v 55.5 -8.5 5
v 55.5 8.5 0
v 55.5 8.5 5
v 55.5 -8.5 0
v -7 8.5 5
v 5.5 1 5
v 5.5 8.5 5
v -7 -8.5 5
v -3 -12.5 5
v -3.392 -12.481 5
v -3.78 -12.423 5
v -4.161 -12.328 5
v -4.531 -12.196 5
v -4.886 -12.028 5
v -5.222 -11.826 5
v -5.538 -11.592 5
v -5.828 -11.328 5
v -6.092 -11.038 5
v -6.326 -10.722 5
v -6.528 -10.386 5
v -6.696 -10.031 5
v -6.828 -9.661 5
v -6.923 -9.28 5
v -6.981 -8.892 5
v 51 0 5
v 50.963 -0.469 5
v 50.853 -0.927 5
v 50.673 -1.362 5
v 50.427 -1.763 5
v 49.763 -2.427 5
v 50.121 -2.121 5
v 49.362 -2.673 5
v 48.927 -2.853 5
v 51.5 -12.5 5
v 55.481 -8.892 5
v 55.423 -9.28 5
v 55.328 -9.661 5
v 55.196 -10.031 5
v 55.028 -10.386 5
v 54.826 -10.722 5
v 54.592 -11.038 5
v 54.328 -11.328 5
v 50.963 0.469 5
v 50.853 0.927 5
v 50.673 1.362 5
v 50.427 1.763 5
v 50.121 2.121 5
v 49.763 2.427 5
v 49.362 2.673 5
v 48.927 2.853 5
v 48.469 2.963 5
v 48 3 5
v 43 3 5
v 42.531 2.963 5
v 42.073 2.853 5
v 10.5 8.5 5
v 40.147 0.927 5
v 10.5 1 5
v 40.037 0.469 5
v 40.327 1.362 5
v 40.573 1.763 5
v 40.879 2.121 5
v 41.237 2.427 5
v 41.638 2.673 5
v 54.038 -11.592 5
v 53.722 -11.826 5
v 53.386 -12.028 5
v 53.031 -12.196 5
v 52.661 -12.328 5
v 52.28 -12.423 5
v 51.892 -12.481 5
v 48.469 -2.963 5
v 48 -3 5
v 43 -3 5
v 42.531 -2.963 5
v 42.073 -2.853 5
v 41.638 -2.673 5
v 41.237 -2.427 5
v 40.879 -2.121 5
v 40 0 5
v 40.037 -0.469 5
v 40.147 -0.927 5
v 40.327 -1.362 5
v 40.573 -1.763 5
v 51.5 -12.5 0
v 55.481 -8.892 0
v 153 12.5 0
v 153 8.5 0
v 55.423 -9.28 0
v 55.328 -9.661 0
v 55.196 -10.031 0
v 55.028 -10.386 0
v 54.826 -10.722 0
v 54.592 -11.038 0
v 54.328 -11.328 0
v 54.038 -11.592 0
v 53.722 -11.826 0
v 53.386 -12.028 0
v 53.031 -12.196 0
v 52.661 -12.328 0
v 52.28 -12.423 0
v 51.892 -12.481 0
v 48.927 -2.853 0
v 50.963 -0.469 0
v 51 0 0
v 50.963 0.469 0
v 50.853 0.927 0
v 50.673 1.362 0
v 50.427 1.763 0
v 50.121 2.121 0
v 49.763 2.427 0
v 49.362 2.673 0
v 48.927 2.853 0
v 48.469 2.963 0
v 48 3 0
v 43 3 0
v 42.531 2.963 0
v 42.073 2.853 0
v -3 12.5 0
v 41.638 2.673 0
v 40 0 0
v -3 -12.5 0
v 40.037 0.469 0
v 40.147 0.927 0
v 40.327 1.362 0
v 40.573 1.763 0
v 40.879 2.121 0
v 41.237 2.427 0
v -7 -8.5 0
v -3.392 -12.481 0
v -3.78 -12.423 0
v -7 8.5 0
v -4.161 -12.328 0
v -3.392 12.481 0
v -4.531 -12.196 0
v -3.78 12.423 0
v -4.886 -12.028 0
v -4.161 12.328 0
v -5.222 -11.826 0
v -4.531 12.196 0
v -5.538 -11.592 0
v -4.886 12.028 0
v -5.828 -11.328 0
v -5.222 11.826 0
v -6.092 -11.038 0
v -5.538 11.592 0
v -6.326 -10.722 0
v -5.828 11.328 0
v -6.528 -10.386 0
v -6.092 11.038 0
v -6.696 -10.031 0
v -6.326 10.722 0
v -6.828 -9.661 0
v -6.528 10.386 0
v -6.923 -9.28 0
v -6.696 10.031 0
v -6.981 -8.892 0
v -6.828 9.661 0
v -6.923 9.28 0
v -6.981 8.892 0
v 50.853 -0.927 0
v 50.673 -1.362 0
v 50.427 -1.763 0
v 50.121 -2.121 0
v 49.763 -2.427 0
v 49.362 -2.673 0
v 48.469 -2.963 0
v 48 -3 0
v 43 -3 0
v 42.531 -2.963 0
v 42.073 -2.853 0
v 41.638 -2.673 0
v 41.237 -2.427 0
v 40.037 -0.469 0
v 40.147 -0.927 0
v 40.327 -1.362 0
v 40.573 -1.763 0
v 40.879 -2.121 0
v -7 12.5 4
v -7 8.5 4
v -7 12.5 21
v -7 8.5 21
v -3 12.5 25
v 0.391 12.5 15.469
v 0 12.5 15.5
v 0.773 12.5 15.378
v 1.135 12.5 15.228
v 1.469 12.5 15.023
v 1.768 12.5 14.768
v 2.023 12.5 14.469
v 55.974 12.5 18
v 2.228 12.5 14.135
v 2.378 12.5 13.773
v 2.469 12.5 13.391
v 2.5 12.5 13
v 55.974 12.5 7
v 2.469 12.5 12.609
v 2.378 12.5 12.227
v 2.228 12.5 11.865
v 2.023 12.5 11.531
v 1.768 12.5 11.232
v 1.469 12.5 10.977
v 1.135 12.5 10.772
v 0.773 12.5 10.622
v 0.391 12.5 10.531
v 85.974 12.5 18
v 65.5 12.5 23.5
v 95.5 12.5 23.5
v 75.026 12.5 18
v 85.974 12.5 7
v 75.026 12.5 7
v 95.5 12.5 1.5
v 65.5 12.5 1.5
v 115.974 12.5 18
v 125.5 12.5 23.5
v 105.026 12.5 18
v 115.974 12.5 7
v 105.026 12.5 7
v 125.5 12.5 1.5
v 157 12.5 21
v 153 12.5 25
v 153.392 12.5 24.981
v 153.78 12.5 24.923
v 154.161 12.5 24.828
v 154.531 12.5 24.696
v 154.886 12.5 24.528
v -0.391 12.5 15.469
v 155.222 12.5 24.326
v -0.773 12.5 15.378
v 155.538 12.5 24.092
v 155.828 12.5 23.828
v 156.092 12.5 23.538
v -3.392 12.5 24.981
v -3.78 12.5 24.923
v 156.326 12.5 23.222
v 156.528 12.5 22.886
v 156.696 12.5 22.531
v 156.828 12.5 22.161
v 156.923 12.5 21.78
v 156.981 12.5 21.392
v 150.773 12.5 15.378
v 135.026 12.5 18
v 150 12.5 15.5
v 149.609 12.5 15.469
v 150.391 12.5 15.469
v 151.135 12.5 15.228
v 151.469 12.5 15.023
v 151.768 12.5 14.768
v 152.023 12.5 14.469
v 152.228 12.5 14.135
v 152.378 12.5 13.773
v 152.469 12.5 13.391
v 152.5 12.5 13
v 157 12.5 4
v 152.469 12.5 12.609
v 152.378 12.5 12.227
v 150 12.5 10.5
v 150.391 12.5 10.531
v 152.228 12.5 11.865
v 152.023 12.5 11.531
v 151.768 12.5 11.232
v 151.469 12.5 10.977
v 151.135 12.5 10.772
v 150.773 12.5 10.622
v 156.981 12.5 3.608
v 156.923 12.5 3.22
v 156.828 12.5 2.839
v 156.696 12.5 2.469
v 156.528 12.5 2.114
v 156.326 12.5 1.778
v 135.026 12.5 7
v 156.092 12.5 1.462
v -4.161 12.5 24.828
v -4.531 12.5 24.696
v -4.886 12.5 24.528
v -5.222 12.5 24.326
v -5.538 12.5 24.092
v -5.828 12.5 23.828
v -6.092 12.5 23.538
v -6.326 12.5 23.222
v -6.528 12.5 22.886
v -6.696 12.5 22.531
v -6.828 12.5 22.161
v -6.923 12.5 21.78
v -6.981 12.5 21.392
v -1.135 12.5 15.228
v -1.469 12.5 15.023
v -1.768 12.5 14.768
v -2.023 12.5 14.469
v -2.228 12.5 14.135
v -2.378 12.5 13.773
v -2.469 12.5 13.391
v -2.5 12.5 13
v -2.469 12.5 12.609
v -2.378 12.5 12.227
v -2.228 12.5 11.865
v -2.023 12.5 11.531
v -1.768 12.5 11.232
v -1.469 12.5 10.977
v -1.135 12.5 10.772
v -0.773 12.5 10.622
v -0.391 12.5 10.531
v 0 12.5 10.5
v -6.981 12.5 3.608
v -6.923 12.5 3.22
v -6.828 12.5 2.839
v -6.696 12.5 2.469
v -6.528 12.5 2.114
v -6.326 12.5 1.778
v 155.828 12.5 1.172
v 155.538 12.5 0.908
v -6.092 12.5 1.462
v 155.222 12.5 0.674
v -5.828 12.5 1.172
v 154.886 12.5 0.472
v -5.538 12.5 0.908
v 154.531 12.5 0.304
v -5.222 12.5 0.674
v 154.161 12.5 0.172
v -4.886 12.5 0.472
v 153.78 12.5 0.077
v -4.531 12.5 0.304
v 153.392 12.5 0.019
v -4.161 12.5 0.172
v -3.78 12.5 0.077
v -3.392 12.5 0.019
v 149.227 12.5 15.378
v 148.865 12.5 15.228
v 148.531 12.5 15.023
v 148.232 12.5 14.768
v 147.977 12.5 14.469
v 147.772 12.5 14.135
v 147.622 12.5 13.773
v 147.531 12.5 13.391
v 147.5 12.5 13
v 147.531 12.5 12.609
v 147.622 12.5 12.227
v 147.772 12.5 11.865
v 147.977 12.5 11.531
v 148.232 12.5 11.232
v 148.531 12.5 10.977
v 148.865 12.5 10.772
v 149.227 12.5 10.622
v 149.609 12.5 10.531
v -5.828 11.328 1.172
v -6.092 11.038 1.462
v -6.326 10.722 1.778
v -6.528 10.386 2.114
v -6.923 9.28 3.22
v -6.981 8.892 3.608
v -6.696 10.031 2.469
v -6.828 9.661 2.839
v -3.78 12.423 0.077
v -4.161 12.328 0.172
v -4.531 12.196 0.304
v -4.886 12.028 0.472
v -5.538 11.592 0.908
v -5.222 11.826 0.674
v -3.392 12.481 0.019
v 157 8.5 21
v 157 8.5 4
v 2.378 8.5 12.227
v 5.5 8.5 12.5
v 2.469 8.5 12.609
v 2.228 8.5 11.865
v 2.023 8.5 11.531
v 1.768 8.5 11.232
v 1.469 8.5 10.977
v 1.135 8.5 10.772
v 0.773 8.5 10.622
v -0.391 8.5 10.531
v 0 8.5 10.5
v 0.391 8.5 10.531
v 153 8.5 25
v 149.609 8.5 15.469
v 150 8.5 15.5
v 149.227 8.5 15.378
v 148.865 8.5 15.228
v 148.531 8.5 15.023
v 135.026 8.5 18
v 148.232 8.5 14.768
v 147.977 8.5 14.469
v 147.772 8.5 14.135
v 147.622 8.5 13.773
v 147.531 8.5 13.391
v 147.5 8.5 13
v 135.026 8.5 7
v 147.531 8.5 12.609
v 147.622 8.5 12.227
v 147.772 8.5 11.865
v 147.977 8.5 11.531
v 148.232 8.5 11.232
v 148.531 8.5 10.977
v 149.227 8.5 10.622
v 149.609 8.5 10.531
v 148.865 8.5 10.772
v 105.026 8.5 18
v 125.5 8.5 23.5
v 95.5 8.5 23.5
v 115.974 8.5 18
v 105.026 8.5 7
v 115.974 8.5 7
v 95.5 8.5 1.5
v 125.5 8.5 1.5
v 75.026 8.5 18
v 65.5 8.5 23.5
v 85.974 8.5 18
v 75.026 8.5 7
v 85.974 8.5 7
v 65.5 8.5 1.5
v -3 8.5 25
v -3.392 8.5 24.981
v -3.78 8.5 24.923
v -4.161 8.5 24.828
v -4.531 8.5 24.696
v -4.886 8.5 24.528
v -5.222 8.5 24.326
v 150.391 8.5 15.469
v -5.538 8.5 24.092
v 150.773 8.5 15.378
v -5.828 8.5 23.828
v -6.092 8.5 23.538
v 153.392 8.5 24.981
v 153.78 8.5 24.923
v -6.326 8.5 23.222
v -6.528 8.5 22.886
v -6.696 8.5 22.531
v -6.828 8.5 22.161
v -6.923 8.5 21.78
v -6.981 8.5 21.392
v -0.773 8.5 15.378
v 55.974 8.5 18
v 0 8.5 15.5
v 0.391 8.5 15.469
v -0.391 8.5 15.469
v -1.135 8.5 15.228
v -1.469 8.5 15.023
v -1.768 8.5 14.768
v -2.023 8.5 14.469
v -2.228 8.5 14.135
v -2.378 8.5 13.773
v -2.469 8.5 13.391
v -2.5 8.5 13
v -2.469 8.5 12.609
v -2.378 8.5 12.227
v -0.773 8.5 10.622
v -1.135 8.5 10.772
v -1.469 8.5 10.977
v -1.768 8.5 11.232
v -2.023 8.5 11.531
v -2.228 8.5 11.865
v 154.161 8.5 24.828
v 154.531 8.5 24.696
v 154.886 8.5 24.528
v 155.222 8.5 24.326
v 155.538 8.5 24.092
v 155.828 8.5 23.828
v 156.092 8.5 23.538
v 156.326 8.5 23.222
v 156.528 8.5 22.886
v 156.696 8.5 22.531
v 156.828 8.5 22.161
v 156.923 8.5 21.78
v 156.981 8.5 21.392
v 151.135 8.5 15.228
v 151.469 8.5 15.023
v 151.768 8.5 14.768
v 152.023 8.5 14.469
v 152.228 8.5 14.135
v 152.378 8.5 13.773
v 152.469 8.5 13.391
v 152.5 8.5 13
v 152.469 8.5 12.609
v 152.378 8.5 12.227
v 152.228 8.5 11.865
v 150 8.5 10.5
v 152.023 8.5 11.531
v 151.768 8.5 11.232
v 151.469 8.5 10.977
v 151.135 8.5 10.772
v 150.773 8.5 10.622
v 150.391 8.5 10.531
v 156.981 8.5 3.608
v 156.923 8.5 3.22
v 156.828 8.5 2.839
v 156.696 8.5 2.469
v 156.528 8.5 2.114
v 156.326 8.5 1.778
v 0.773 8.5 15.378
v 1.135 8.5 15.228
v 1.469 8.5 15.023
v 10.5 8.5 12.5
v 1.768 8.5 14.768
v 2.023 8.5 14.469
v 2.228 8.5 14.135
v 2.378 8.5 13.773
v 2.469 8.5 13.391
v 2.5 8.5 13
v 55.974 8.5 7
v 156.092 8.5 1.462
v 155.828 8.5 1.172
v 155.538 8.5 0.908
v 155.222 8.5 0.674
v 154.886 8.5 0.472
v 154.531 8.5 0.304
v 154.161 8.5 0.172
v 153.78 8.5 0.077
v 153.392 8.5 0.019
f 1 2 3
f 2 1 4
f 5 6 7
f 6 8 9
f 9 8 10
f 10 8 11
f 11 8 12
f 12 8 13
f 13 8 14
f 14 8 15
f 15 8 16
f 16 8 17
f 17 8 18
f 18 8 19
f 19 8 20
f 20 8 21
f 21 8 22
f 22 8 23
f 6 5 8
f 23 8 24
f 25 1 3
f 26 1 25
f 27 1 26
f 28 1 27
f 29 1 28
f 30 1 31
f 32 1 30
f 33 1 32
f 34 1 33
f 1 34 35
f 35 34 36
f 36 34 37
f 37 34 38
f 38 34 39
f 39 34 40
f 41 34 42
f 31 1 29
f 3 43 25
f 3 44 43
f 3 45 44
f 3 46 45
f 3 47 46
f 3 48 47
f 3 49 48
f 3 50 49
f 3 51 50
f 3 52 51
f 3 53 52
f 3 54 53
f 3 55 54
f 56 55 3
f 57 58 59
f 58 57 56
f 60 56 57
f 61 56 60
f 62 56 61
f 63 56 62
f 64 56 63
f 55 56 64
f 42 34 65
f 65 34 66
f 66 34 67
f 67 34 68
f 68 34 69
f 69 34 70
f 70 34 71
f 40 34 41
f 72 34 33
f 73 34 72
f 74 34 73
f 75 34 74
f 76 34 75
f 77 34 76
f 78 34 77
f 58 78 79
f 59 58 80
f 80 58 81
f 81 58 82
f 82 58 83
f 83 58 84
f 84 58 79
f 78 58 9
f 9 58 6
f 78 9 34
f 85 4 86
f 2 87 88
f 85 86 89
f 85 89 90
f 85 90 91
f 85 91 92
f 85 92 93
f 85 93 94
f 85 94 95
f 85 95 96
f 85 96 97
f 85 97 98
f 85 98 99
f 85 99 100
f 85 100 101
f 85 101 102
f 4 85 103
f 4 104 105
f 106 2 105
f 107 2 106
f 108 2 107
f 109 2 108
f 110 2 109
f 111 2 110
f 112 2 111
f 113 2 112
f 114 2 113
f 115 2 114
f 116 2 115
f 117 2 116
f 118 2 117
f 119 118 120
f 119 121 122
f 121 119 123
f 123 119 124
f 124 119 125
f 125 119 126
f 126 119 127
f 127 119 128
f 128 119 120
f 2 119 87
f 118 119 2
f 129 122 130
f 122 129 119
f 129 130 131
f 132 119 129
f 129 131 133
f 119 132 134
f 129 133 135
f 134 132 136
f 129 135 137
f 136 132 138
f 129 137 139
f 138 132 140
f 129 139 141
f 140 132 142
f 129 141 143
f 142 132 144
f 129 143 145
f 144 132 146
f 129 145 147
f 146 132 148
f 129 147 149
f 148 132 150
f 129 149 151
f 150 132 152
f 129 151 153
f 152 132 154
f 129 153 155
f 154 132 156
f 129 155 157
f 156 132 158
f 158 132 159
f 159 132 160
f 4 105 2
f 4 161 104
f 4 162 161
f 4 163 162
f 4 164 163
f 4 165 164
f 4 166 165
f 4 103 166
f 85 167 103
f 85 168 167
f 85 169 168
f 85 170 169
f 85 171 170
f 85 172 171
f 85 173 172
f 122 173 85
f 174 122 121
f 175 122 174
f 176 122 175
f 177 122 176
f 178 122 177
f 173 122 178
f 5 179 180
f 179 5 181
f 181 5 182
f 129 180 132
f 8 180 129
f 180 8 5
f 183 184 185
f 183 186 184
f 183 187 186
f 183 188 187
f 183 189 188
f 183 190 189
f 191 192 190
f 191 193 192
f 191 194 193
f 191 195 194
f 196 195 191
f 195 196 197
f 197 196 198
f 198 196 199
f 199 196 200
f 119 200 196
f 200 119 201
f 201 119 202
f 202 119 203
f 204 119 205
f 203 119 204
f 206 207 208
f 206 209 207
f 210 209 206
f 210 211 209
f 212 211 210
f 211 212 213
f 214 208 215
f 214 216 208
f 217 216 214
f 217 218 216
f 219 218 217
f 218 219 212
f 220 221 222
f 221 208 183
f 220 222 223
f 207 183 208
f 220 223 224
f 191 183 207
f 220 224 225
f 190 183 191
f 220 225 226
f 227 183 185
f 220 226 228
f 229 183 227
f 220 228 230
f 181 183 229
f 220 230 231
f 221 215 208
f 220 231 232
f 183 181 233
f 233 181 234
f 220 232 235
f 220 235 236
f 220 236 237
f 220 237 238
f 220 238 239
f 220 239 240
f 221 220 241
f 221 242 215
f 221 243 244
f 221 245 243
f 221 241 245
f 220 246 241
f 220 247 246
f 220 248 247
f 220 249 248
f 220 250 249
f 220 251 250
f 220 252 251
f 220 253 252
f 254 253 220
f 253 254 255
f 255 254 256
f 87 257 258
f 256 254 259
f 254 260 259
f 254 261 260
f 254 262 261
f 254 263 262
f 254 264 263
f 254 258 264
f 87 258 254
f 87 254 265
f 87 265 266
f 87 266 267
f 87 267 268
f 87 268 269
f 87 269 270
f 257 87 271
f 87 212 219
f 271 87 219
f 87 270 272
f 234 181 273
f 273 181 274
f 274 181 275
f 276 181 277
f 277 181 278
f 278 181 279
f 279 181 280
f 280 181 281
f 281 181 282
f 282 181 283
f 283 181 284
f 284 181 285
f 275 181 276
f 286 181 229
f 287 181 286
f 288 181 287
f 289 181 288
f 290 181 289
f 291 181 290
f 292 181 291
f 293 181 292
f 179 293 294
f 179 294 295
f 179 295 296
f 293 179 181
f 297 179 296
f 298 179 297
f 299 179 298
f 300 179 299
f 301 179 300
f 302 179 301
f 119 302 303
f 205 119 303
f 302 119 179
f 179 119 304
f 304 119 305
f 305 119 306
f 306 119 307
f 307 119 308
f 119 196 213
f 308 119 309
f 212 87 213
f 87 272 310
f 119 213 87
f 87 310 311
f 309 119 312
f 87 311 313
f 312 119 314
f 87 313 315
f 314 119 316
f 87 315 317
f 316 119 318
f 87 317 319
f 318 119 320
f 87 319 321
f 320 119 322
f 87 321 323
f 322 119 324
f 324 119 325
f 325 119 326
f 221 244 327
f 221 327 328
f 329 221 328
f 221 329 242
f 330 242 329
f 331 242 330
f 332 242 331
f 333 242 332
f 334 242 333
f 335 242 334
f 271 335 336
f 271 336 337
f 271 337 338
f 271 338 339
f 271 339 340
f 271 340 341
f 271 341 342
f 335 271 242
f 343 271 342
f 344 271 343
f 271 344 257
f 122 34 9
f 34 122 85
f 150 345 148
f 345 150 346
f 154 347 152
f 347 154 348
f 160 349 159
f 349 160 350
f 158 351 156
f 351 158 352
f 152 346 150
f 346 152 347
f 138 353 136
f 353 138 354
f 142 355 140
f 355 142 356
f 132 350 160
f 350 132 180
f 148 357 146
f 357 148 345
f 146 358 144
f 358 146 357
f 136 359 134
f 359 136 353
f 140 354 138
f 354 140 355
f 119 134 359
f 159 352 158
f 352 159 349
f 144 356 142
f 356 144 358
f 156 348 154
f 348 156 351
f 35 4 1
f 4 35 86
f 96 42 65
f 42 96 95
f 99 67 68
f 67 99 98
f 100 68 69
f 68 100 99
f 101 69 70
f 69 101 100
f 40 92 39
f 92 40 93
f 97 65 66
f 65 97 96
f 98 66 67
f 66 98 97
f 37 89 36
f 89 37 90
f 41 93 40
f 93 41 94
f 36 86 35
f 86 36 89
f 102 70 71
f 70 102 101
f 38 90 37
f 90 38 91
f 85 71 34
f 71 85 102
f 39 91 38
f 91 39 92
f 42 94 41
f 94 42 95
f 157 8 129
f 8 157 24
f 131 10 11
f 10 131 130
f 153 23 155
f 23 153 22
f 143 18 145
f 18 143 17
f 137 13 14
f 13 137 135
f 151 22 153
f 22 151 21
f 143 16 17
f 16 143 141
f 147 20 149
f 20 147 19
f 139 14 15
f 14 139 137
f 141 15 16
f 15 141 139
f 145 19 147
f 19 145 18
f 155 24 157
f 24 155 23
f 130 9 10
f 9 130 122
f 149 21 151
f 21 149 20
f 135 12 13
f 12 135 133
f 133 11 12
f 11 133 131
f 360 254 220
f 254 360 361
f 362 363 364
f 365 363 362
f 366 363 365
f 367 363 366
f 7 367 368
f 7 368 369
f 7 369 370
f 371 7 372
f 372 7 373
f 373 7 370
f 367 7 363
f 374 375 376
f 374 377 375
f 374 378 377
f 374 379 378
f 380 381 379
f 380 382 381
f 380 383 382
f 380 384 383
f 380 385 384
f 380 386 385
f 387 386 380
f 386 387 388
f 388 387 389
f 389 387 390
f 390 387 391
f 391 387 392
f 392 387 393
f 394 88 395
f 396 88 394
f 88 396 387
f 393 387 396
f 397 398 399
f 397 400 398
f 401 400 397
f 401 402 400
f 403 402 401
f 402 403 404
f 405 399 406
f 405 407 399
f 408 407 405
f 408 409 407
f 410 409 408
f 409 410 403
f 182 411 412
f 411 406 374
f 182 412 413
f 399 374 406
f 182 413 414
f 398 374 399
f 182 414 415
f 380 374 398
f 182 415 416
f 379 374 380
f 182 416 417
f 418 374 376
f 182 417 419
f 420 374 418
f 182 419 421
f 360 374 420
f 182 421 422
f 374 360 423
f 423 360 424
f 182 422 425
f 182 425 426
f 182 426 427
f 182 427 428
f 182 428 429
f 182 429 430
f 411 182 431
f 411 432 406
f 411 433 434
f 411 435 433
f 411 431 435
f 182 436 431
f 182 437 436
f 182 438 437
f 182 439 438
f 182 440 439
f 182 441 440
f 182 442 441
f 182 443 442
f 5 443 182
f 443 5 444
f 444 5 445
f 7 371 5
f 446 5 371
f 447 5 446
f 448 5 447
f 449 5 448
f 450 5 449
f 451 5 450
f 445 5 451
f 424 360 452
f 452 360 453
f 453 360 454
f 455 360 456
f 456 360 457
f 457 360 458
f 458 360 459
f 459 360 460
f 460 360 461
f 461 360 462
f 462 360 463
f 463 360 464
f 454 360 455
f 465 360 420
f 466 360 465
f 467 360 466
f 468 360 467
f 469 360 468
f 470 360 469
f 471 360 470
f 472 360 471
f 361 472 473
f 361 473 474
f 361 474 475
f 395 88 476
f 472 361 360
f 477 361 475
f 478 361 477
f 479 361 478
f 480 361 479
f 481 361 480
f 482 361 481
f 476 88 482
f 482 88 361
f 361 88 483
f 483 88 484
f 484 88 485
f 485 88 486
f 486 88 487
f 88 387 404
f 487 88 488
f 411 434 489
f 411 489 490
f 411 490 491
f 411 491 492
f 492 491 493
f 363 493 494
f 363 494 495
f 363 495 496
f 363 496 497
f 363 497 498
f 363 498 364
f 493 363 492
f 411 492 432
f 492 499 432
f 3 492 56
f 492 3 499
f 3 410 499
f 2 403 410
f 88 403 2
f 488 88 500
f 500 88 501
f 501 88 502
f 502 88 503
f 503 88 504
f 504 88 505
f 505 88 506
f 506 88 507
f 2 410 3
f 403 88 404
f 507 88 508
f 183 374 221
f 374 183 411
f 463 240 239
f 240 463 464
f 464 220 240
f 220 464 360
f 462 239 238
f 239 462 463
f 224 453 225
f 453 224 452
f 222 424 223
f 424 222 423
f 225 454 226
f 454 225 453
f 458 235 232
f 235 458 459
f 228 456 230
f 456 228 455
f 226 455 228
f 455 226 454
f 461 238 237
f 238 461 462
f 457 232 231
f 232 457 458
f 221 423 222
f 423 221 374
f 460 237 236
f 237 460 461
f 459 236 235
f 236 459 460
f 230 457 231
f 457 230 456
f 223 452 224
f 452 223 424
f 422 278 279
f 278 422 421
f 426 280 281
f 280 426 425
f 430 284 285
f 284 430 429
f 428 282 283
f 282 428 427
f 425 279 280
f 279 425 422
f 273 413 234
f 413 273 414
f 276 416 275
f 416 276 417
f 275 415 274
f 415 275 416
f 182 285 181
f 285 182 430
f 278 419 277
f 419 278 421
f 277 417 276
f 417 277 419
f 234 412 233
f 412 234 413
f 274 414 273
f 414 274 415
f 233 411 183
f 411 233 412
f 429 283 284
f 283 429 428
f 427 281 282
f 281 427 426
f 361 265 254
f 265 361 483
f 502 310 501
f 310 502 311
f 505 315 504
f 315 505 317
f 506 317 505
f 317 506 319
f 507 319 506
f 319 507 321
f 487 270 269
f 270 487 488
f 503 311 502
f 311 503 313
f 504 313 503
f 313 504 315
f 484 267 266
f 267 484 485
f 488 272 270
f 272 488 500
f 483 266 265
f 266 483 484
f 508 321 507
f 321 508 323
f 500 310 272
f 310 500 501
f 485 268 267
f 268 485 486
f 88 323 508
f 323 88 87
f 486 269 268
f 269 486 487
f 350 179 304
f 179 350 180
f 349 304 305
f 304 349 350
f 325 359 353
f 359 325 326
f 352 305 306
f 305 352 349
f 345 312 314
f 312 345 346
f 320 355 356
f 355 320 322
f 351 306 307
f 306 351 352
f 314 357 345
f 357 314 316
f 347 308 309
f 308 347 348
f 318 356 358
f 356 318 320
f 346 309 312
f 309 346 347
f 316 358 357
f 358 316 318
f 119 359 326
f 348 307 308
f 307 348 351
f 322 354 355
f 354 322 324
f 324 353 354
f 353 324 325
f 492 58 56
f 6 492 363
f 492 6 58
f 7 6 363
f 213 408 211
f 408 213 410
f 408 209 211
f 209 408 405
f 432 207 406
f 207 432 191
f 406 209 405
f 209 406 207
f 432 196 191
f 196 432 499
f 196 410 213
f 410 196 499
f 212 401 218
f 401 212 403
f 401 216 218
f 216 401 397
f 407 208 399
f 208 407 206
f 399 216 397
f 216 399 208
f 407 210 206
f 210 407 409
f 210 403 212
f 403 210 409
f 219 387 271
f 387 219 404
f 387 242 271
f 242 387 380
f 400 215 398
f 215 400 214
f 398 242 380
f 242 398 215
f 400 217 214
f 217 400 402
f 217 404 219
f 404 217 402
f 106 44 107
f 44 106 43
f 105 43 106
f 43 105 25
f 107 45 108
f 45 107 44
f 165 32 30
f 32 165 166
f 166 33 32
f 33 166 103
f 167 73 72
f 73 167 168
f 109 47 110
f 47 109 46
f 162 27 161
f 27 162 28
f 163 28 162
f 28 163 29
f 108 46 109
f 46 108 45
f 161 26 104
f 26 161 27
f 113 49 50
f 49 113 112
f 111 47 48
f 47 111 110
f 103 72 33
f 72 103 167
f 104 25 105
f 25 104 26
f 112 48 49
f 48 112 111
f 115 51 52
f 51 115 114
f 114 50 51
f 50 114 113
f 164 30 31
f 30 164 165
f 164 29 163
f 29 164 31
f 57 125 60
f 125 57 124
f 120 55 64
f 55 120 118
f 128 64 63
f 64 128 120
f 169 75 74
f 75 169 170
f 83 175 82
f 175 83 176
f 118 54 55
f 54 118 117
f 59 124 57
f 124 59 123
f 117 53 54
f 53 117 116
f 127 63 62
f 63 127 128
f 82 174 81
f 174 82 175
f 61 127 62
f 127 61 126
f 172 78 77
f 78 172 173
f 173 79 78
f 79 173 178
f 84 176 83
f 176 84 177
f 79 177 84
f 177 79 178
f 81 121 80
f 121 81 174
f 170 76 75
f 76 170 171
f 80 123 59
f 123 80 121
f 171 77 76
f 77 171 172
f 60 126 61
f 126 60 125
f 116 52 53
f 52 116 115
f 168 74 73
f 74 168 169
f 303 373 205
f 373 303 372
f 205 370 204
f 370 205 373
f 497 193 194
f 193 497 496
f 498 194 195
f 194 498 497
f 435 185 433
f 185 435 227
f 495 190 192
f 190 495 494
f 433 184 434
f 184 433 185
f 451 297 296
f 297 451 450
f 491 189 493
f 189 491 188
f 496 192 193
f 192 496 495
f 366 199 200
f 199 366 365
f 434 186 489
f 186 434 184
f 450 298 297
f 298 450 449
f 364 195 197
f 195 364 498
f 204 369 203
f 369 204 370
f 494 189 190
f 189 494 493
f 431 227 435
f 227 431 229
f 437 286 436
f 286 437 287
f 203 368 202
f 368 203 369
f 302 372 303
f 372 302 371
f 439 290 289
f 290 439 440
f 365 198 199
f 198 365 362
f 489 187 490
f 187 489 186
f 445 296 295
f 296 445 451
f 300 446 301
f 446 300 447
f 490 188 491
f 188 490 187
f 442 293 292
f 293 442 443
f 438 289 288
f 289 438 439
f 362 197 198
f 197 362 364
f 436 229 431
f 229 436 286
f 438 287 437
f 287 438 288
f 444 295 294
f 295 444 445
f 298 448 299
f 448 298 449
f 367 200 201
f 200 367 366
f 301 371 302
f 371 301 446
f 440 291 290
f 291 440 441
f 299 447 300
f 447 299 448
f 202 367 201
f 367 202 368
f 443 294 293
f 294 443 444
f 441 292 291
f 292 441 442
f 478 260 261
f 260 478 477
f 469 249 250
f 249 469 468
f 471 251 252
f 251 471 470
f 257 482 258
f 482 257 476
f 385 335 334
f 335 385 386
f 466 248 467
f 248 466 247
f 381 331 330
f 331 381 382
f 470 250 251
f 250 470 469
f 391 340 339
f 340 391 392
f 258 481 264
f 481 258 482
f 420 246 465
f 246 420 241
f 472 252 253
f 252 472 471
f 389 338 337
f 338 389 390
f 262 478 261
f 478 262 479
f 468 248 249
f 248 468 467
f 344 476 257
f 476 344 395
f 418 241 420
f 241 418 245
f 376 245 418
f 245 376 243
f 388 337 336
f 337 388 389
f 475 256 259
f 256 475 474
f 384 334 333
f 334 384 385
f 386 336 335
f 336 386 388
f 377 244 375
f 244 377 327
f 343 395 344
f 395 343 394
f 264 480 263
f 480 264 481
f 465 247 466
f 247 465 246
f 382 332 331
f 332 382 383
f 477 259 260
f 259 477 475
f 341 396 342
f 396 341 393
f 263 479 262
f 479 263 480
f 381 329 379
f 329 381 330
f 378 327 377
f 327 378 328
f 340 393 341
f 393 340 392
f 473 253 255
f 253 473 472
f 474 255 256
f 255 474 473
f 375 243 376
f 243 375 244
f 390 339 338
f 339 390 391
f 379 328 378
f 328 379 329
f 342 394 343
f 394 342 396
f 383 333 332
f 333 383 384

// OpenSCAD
distance_leftscrew_to_mount = 45.5;

difference()
{
    union()
    {
        translate([(distance_leftscrew_to_mount+7+10)/2-7,0,5/2])
        rounded_box(distance_leftscrew_to_mount+7+10,25,5,4,$fn=64);
        
        translate([0,25/2+1/2,0])
        rotate([90,0,0])
        translate([(150+7*2)/2-7,25/2,5/2])
        rounded_box(150+7*2,25,4,4,$fn=64);
        
        translate([8,-5+11,5])
        rotate([0,0,-90])
        ramp(10,5,10,0);
        
        //translate([66,-5+11,5])
        //rotate([0,0,-90])
        //ramp(10,5,10,0);
    }
    
    for(i=[0:2])
    translate([distance_leftscrew_to_mount+20+i*30,25/2+1,25/2])
    rotate([90,0,0])
    rotate([0,0,30])
    cylinder(d=22,h=6,$fn=6);
    
    translate([distance_leftscrew_to_mount,0,-1])
    stretched_cylinder(d=6,h=7,$fn=40,stretch=5);
    
    translate([0,25/2,12.8+0.2])
    rotate([90,0,0])
    translate([0,0,-1])
    cylinder(d=5,h=7,$fn=40);
    
    translate([0,25/2,12.8+0.2])
    rotate([90,0,0])
    translate([150,0,-1])
    cylinder(d=5,h=7,$fn=40);
}

module stretched_cylinder(d, h, stretch, center=false)
{
  if (center)
    stretched_cylinder_geom(d=d, h=h, stretch=stretch);
  else
    translate([0,0,h/2])
    stretched_cylinder_geom(d=d, h=h, stretch=stretch);
}

module stretched_cylinder_geom(d, h, stretch)
{
    union()
    {
        translate([stretch/2,0,0])
        cylinder(d=d,h=h,center=true);
        
        translate([-stretch/2,0,0])
        cylinder(d=d,h=h,center=true);
        
        cube([stretch,d,h],center=true);
    }
}

module ramp(x,y,z1,z2)
{
    rotate([90,0,0])
    translate([0,0,-y/2])
    linear_extrude(height=y)
    {
        polygon(points=[[-x/2,0],[-x/2,z1],[x/2,z2],[x/2,0]]);
    }
}

module rounded_box(x,y,z,radius,$fn=$fn)
{
    union()
    {
        cube([x,y-2*radius,z],center=true);
        cube([x-2*radius,y,z],center=true);
        
        translate([(x/2-radius),(y/2-radius),0])
        cylinder(r=radius,h=z,center=true);
        
        translate([-(x/2-radius),(y/2-radius),0])
        cylinder(r=radius,h=z,center=true);
        
        translate([(x/2-radius),-(y/2-radius),0])
        cylinder(r=radius,h=z,center=true);
        
        translate([-(x/2-radius),-(y/2-radius),0])
        cylinder(r=radius,h=z,center=true);
    }
}
